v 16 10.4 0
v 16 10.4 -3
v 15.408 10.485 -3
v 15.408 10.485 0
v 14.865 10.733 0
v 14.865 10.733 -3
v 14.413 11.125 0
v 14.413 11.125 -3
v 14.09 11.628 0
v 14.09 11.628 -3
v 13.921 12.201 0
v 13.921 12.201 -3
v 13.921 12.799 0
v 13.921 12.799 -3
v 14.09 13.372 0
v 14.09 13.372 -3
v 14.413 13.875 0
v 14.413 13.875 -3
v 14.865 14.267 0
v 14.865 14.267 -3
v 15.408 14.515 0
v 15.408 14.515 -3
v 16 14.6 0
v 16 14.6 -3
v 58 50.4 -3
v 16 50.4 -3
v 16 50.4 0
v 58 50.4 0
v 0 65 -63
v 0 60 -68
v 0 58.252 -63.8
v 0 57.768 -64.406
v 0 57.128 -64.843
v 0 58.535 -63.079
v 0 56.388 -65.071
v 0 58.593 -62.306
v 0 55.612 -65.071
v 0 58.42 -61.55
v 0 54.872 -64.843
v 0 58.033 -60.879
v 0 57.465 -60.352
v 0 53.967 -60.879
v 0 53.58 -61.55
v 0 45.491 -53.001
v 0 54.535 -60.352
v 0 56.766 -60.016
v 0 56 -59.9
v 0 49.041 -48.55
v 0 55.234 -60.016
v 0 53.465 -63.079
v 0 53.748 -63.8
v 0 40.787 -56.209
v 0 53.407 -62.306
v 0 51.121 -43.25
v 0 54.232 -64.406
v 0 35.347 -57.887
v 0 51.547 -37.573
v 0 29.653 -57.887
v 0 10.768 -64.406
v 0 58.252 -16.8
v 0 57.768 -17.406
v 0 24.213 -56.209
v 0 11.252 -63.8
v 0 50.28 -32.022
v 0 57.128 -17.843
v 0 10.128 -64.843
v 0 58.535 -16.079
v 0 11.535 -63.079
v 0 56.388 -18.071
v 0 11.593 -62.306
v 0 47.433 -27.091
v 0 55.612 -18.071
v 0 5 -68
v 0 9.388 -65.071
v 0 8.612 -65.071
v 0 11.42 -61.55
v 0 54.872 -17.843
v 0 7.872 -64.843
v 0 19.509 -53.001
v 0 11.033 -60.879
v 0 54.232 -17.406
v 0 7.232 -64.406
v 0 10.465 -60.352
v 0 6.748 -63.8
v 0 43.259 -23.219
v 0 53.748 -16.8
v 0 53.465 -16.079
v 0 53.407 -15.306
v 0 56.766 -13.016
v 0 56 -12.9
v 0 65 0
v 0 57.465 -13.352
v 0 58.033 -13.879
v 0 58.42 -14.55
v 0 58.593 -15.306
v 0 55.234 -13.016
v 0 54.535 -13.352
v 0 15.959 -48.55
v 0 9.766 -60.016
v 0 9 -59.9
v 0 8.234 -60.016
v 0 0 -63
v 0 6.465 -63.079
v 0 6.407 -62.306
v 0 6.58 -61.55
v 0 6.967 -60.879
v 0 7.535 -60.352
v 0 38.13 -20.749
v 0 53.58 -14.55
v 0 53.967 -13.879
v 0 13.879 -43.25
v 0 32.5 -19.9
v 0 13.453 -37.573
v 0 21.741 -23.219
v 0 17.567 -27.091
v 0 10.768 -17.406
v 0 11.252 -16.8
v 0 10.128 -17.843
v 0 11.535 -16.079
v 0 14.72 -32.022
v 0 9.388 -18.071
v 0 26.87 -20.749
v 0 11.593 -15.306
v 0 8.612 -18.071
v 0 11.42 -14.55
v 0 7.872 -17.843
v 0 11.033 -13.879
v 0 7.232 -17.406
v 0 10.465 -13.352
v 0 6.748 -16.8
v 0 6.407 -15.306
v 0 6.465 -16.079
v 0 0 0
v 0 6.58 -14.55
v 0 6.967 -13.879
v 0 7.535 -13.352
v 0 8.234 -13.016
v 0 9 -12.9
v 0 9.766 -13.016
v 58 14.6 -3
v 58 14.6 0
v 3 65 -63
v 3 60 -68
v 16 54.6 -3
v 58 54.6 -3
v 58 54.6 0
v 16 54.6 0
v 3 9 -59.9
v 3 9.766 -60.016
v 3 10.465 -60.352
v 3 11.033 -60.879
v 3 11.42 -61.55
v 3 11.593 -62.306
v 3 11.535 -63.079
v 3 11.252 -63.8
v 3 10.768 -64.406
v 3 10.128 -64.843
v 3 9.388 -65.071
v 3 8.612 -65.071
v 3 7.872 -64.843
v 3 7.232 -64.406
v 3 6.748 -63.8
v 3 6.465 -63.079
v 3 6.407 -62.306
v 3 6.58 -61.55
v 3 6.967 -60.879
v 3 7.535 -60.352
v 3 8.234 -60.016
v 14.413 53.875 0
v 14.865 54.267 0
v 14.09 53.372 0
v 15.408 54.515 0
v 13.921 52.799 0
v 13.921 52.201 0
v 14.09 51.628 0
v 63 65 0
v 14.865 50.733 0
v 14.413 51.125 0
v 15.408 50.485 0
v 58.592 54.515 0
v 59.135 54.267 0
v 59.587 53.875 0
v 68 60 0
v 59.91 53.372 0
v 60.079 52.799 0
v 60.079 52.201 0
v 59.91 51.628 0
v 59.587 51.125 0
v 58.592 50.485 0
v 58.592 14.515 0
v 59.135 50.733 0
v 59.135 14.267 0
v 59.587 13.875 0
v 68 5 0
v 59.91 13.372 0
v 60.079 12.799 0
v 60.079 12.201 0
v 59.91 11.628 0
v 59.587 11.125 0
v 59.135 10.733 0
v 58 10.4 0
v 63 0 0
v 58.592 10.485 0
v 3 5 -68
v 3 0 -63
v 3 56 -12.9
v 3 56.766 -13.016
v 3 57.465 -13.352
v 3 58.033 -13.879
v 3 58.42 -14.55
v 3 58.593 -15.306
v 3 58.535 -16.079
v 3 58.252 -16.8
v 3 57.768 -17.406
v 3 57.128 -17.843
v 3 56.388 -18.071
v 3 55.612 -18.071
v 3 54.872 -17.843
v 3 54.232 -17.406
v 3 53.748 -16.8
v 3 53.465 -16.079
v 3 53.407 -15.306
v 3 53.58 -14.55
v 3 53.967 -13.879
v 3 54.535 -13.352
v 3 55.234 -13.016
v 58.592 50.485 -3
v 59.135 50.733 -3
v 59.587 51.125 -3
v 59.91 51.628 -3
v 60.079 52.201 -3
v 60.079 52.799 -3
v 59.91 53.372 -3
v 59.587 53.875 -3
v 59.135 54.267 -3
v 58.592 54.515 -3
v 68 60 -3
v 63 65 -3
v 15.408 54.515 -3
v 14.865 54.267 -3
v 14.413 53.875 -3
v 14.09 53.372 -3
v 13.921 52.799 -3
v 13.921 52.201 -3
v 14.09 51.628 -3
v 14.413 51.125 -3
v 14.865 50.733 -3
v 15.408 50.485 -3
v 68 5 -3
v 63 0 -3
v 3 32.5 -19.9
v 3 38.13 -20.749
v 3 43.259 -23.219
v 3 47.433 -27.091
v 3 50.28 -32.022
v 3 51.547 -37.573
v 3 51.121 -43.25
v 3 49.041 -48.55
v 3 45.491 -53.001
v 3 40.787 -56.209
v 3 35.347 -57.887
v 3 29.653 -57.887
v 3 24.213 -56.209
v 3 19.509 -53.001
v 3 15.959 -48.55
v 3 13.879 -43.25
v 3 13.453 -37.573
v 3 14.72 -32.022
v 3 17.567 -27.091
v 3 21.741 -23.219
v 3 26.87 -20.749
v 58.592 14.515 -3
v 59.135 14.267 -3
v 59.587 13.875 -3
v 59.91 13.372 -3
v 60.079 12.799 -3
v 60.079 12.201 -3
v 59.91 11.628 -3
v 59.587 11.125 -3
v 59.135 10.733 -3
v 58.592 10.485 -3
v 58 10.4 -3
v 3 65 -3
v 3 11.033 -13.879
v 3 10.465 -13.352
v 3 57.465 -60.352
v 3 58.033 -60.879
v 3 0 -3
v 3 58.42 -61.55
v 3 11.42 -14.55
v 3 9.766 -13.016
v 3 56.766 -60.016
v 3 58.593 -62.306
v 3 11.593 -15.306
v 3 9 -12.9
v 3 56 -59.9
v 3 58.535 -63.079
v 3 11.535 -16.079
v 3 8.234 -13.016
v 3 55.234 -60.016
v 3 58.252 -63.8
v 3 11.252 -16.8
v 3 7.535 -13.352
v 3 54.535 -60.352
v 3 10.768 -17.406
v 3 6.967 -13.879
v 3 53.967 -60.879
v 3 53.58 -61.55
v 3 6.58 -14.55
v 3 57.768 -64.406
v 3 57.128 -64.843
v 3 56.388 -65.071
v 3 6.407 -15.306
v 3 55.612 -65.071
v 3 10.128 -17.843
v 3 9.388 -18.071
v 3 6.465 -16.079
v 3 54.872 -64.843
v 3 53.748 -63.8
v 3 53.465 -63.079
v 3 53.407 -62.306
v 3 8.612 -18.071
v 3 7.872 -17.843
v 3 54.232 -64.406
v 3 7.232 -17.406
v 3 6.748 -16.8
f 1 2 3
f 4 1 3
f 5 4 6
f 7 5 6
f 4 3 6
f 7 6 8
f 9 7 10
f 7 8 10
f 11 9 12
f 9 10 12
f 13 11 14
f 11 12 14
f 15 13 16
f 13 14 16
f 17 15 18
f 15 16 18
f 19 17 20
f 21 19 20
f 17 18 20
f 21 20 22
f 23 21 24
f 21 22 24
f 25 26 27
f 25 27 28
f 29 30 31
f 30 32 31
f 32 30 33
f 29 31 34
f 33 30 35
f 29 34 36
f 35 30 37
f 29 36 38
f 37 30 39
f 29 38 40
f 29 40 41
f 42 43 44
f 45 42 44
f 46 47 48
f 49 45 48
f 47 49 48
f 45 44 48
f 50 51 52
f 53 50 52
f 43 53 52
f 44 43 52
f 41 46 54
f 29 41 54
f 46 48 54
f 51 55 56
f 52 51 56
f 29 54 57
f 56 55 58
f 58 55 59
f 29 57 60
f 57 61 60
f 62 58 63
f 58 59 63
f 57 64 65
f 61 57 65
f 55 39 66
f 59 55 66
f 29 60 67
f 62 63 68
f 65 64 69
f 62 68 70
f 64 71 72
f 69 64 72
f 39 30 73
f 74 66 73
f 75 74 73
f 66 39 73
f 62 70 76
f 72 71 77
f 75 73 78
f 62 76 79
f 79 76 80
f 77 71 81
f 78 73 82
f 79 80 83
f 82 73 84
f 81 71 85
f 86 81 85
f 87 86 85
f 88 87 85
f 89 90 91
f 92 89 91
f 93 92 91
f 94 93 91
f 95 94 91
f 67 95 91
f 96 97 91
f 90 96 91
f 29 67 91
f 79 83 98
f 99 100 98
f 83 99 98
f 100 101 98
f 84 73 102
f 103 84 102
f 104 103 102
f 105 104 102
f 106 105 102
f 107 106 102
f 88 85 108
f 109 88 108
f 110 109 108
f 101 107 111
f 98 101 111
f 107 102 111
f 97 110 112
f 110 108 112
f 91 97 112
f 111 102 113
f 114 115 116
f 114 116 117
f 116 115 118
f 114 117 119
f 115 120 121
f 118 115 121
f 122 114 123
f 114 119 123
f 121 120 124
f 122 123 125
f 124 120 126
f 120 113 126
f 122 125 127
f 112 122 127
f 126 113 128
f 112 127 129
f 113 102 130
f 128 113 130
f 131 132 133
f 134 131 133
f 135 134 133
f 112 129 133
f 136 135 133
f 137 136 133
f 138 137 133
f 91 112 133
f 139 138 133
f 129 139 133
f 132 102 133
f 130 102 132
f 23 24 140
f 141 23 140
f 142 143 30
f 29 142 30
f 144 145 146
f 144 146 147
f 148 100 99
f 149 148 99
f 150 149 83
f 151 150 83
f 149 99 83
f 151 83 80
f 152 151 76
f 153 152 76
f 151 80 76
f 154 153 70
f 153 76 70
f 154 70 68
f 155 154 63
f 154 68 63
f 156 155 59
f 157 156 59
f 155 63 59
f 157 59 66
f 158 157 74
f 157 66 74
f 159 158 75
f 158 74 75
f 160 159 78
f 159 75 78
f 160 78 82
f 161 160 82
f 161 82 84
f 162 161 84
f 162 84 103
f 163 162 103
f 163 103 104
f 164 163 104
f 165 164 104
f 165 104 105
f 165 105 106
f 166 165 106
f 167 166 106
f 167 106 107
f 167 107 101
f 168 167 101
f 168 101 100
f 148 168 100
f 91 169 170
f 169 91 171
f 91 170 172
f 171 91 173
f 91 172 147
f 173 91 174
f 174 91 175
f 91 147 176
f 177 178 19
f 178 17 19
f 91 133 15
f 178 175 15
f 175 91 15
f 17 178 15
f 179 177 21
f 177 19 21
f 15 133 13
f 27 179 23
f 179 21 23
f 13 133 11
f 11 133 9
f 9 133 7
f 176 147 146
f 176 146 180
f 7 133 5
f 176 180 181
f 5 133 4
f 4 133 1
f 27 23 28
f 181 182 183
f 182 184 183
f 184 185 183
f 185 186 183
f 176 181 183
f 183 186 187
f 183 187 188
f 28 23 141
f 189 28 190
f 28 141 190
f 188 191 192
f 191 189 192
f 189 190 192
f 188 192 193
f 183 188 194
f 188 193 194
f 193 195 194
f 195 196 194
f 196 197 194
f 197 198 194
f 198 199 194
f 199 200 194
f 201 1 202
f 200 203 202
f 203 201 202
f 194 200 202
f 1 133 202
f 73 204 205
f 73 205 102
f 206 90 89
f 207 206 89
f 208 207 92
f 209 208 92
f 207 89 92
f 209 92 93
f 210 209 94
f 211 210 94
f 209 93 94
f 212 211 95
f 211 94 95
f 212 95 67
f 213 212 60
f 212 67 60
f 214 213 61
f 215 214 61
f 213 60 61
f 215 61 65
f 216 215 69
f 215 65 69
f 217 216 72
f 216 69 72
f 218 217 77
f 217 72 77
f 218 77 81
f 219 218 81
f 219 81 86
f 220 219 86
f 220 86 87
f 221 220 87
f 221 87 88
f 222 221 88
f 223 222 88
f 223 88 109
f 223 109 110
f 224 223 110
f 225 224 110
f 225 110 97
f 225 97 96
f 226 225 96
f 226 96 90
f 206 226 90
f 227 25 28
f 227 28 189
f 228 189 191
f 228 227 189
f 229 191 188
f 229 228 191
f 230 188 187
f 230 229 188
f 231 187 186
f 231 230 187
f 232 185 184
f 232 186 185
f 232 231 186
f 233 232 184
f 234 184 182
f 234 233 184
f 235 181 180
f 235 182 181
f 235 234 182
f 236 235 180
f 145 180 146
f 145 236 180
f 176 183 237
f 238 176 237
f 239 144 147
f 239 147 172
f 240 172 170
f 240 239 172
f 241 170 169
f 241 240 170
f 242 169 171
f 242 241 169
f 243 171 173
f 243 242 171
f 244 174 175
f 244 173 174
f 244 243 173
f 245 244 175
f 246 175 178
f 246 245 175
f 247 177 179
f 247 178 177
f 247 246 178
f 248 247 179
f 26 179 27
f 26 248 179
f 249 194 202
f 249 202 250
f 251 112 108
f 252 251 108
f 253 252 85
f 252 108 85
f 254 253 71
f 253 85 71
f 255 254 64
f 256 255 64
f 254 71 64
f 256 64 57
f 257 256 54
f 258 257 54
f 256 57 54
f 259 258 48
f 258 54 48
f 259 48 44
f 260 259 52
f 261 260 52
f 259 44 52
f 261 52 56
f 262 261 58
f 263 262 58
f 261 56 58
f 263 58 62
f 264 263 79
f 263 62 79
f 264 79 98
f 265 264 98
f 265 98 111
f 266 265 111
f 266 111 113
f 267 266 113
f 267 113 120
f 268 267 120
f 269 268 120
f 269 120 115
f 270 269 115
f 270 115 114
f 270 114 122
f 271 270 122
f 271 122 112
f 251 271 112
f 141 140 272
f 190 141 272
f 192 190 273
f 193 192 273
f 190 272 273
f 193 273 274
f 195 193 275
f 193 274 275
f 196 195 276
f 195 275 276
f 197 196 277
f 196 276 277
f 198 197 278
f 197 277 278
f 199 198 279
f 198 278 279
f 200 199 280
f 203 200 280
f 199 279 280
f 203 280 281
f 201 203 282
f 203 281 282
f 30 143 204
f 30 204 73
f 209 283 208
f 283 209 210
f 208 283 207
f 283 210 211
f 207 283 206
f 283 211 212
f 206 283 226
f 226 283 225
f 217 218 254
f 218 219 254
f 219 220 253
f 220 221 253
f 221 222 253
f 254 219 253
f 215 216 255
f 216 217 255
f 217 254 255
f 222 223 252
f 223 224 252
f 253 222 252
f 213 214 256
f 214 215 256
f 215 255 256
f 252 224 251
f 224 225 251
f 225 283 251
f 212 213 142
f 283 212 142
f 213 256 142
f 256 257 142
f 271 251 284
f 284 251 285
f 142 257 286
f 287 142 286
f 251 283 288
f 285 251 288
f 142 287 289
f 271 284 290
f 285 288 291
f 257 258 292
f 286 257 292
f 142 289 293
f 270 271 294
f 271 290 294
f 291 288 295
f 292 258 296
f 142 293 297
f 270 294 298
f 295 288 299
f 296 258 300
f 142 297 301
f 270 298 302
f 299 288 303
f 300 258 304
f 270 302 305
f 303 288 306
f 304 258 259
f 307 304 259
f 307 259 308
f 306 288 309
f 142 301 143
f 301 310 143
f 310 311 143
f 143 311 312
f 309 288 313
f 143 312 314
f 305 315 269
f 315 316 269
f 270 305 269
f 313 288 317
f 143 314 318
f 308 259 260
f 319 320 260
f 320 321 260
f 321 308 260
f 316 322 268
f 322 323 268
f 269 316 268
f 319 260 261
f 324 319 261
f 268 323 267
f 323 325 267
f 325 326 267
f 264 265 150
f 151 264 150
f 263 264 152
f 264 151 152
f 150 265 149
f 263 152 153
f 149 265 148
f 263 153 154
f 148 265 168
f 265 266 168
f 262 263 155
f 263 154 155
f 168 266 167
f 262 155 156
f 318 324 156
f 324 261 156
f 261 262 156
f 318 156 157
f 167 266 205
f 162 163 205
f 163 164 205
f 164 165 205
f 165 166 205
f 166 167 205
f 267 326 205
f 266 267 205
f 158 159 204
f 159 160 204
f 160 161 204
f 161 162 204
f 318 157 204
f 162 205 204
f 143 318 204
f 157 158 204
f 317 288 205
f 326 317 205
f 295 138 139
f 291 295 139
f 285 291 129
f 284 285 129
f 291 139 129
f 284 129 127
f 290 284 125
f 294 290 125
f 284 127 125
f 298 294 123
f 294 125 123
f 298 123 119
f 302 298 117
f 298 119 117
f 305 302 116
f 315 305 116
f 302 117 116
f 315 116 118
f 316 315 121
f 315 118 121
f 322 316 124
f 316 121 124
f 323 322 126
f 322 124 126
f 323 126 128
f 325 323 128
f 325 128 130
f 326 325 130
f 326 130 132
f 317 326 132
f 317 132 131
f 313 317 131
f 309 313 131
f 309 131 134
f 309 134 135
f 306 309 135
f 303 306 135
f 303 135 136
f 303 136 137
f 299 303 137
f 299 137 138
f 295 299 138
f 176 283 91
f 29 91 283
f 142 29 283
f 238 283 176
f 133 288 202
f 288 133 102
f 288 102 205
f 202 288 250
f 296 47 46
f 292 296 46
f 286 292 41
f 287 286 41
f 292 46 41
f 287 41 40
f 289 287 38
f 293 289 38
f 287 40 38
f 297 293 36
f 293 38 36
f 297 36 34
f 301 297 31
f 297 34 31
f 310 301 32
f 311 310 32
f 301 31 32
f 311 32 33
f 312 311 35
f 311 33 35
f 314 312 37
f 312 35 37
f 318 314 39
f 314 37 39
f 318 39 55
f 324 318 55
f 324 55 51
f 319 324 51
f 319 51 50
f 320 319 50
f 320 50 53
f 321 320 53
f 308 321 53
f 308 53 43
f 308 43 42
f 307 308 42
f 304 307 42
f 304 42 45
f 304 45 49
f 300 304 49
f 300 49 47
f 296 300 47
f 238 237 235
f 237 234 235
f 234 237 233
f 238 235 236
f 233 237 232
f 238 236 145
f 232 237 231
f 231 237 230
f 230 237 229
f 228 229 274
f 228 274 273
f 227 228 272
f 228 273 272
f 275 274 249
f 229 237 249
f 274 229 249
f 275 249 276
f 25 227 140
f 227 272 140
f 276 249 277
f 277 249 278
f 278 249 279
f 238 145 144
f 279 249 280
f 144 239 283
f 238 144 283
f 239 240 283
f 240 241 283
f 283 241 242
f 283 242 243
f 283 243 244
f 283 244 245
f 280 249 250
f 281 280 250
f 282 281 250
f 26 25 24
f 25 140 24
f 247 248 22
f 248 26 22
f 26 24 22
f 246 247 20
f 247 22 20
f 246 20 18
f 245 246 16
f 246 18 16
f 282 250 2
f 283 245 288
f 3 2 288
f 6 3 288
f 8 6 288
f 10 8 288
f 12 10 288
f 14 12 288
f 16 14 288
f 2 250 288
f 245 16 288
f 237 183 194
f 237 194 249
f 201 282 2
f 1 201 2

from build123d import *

# Parameters (mm, degrees)
EXTRUDE_1_DEPTH     = 65
SKETCH_2_R          = 19.1
SKETCH_2_R_2        = 2.6
CUT_EXTRUDE_1_DEPTH = 117.073252733
CUT_EXTRUDE_2_DEPTH = 115.341593482
CHAMFER_1_SIZE      = 5


with BuildPart() as part:
    # 草图1 → 凸台-拉伸1 (new body)
    with BuildSketch(Plane(origin=(0, 0, 0), x_dir=(1, 0, 0), z_dir=(0, 1, 0))):
        Polygon((0, 0), (68, 0), (68, 3), (3, 3), (3, 68), (0, 68), align=None)
    extrude(amount=EXTRUDE_1_DEPTH)

    # 草图2 → 切除-拉伸1 (cut, through all)
    with BuildSketch(Plane.ZY):
        with Locations((-39, 32.5)):
            Circle(SKETCH_2_R)
        with Locations((-62.5, 56)):
            Circle(SKETCH_2_R_2)
        with Locations((-62.5, 9)):
            Circle(SKETCH_2_R_2)
        with Locations((-15.5, 56)):
            Circle(SKETCH_2_R_2)
        with Locations((-15.5, 9)):
            Circle(SKETCH_2_R_2)
    extrude(amount=-CUT_EXTRUDE_1_DEPTH, mode=Mode.SUBTRACT)

    # 草图3 → 切除-拉伸2 (cut, through all)
    with BuildSketch(Plane(origin=(0, 0, -3), x_dir=(-1, 0, 0), z_dir=(0, 0, -1))):
        with BuildLine():
            Line((-16, 14.6), (-58, 14.6))
            ThreePointArc((-58, 14.6), (-60.1, 12.5), (-58, 10.4))
            Line((-58, 10.4), (-16, 10.4))
            ThreePointArc((-16, 10.4), (-13.9, 12.5), (-16, 14.6))
        make_face()
    cut_extrude_2 = extrude(amount=-CUT_EXTRUDE_2_DEPTH, mode=Mode.SUBTRACT)

    # 镜向1: 切除-拉伸2 across plane
    add(cut_extrude_2.mirror(Plane.ZX.offset(32.5)), mode=Mode.SUBTRACT)

    # 倒角1
    chamfer_1_edges = [part.edges().sort_by_distance(p)[0] for p in [
        (1.5, 65, -68),
        (68, 65, -1.5),
        (68, 0, -1.5),
        (1.5, 0, -68),
    ]]
    chamfer(chamfer_1_edges, length=CHAMFER_1_SIZE)


solid = part.part
